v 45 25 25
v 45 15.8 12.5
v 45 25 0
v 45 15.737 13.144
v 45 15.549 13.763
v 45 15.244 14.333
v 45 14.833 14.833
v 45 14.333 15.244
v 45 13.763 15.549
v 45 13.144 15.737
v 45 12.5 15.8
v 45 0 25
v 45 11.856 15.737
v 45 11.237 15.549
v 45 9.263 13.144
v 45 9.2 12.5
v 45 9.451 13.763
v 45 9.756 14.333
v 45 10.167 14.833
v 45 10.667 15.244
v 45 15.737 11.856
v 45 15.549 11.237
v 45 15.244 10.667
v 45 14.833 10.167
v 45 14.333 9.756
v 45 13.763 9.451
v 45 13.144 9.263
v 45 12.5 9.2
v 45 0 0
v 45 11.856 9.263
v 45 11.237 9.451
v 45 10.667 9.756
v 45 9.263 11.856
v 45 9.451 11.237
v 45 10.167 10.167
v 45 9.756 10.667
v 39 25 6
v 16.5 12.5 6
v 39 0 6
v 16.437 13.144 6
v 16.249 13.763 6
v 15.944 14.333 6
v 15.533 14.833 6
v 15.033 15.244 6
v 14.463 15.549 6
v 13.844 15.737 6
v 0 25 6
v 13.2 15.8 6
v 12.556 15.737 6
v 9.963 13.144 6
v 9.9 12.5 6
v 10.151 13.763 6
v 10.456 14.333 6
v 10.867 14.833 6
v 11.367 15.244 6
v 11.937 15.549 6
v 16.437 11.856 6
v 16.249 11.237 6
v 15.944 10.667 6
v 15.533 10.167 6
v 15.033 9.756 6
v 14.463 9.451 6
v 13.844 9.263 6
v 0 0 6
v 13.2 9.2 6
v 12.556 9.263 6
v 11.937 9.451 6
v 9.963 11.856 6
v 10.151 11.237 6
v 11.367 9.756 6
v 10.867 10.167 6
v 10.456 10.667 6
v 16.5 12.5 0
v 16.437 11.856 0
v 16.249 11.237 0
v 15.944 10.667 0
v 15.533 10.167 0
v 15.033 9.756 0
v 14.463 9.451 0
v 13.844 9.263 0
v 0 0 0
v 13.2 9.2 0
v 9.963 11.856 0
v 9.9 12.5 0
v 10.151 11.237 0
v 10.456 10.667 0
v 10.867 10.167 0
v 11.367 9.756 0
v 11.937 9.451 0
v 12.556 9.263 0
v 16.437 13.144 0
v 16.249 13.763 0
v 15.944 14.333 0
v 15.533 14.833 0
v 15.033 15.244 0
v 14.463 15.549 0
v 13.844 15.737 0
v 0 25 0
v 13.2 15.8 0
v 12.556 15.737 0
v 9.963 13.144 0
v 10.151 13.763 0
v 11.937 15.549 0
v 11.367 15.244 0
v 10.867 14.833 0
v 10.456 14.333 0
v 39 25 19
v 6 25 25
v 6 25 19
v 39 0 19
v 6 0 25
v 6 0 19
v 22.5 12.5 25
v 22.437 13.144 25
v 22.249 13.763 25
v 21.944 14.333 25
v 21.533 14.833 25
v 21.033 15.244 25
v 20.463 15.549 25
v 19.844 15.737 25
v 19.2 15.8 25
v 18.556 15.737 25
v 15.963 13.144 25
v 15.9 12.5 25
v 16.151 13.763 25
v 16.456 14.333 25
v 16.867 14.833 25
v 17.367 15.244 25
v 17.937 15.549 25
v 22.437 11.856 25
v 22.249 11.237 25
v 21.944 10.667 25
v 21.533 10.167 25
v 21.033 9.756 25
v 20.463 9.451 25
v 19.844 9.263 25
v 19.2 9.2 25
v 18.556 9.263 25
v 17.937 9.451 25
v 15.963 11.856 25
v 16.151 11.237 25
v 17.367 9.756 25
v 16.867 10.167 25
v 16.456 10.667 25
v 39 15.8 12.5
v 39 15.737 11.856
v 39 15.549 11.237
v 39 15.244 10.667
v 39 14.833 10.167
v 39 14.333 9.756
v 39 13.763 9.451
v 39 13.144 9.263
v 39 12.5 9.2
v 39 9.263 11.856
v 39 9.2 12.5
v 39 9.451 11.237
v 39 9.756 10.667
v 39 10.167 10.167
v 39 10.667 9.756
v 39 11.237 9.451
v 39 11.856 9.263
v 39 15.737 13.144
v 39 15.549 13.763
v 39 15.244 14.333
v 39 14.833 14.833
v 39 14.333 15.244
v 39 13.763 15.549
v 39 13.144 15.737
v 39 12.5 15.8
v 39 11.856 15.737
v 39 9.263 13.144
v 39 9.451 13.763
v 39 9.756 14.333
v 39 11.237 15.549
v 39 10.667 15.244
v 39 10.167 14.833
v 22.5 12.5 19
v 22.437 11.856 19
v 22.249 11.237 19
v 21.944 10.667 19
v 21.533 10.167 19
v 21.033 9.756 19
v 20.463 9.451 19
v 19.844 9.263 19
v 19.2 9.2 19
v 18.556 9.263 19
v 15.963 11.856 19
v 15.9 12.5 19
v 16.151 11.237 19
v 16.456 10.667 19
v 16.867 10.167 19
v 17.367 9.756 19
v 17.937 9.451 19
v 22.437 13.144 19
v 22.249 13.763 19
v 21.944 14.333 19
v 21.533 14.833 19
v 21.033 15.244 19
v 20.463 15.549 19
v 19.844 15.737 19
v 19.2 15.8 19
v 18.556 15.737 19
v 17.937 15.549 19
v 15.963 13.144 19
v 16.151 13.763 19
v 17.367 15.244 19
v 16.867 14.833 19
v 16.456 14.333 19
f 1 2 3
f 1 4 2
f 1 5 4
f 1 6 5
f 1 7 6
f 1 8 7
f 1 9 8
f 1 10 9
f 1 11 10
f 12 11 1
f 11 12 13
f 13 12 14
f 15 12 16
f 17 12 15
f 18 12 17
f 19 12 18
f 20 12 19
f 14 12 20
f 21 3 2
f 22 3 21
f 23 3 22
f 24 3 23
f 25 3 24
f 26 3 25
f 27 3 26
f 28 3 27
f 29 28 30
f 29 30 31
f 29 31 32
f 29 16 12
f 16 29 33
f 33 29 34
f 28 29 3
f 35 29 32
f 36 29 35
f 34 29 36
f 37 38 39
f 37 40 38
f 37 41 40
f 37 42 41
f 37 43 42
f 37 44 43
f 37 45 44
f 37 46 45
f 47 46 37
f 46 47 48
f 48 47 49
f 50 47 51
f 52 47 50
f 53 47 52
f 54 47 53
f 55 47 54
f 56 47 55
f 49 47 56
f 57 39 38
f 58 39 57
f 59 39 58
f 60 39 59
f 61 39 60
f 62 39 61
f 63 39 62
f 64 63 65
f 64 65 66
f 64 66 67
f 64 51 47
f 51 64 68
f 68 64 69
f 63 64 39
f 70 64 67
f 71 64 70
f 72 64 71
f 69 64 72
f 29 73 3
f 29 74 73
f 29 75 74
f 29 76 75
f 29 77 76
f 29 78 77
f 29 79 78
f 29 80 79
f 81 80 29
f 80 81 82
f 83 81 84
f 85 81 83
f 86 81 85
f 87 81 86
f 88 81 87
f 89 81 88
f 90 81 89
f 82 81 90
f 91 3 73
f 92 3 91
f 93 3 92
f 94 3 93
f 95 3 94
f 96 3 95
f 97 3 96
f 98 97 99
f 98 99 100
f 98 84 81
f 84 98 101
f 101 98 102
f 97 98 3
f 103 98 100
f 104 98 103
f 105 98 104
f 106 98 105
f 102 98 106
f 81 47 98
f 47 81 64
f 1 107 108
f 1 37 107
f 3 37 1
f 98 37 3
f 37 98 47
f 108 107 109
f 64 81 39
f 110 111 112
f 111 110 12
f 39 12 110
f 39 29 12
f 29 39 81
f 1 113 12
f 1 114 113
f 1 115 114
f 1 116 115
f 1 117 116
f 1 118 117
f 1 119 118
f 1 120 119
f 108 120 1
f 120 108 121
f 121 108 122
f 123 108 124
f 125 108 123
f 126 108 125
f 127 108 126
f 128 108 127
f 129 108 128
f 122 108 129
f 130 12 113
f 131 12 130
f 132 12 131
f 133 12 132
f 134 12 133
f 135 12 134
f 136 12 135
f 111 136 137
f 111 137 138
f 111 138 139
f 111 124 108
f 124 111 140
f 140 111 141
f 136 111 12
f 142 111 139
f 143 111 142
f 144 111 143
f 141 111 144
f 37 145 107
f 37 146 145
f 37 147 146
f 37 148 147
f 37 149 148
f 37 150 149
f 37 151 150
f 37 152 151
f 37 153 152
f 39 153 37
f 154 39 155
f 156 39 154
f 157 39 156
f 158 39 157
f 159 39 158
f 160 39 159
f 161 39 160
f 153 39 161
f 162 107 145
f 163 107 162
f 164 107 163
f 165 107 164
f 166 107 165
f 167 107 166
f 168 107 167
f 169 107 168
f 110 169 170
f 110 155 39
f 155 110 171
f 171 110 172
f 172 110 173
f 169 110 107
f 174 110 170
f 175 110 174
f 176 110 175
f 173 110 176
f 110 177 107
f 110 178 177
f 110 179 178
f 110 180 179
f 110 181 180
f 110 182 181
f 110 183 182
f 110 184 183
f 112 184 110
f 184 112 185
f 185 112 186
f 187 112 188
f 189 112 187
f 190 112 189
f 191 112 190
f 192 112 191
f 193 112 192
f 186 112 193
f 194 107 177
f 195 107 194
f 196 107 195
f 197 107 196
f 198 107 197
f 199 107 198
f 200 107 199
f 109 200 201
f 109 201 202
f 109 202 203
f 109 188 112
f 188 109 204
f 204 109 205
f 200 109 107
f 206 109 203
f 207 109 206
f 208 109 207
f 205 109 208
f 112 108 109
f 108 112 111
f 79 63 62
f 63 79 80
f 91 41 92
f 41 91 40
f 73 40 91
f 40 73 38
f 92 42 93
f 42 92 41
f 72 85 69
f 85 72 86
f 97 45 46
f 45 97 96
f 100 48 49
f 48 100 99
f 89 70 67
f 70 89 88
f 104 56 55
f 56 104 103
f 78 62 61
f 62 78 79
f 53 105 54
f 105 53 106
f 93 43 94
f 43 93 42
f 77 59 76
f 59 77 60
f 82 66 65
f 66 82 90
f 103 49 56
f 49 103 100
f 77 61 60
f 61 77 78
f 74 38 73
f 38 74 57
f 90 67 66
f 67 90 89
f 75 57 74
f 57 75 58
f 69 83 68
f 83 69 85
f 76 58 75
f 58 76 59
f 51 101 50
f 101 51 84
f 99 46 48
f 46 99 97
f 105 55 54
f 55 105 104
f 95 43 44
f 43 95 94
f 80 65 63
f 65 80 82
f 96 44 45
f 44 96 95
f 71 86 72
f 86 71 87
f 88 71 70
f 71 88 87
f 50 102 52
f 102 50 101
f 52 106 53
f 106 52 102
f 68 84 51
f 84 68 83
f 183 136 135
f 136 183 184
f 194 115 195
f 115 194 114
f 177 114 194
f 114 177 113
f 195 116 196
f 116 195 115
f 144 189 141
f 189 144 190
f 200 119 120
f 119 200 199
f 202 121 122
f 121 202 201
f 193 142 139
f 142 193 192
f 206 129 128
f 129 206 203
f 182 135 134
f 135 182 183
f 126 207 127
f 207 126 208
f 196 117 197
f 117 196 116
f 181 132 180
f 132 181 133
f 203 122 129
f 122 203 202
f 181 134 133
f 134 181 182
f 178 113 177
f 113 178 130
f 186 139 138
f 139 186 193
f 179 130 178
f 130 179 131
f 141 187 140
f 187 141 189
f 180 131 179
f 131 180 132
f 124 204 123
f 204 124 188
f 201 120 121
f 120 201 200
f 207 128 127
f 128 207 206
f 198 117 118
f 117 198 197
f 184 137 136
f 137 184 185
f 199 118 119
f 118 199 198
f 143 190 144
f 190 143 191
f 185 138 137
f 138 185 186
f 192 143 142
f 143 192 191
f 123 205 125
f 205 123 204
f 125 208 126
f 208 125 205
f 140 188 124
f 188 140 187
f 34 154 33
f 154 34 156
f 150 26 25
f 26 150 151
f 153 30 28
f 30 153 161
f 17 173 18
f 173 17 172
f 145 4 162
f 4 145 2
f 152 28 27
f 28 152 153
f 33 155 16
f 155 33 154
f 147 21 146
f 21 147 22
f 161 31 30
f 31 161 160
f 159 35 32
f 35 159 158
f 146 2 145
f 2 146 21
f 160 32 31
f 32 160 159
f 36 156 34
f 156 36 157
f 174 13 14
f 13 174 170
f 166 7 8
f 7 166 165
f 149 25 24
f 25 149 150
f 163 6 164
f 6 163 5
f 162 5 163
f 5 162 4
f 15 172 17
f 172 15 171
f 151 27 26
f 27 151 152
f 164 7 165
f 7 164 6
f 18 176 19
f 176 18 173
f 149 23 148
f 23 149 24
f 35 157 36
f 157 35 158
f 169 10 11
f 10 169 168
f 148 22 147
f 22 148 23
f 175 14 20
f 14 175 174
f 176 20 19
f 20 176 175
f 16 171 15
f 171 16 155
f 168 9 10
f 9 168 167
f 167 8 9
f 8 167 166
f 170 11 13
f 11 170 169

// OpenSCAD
$fn = 32;

// ----------------------------------------------------------------------
// Z-bracket: 45 x 25 x 25 mm
// ----------------------------------------------------------------------

// --- parameters (mm) ---
lower_len = 45;           // lower foot length, X
upper_len = 33;           // upper foot length, X
width = 25;               // bracket width, Y
rise = 25;                // overall rise, Z
thick = 6;                // plate thickness
hole_d = 6.6;             // clearance for M6

module hole_z(px, py, z0) {
  translate([px, py, z0 - 2.5]) cylinder(h = thick + 5, d = hole_d);
}
module hole_x(py, pz) {
  translate([-2.5, py, pz]) rotate([0, 90, 0]) cylinder(h = thick + 5, d = hole_d);
}

difference() {
  union() {
    cube([lower_len, width, thick]);
    /* web, overlapping the lower foot */
    translate([lower_len - thick, 0, 0]) cube([thick, width, rise]);
    /* upper foot, sunk into the web */
    translate([lower_len - thick - upper_len, 0, rise - thick]) cube([upper_len + thick, width, thick]);
  }
  hole_z(13.2, 12.5, 0);
  translate([lower_len - thick - 19.8, 0, 0]) hole_z(0, 12.5, rise - thick);
  translate([lower_len - thick, 0, 0]) hole_x(12.5, 12.5);
}
